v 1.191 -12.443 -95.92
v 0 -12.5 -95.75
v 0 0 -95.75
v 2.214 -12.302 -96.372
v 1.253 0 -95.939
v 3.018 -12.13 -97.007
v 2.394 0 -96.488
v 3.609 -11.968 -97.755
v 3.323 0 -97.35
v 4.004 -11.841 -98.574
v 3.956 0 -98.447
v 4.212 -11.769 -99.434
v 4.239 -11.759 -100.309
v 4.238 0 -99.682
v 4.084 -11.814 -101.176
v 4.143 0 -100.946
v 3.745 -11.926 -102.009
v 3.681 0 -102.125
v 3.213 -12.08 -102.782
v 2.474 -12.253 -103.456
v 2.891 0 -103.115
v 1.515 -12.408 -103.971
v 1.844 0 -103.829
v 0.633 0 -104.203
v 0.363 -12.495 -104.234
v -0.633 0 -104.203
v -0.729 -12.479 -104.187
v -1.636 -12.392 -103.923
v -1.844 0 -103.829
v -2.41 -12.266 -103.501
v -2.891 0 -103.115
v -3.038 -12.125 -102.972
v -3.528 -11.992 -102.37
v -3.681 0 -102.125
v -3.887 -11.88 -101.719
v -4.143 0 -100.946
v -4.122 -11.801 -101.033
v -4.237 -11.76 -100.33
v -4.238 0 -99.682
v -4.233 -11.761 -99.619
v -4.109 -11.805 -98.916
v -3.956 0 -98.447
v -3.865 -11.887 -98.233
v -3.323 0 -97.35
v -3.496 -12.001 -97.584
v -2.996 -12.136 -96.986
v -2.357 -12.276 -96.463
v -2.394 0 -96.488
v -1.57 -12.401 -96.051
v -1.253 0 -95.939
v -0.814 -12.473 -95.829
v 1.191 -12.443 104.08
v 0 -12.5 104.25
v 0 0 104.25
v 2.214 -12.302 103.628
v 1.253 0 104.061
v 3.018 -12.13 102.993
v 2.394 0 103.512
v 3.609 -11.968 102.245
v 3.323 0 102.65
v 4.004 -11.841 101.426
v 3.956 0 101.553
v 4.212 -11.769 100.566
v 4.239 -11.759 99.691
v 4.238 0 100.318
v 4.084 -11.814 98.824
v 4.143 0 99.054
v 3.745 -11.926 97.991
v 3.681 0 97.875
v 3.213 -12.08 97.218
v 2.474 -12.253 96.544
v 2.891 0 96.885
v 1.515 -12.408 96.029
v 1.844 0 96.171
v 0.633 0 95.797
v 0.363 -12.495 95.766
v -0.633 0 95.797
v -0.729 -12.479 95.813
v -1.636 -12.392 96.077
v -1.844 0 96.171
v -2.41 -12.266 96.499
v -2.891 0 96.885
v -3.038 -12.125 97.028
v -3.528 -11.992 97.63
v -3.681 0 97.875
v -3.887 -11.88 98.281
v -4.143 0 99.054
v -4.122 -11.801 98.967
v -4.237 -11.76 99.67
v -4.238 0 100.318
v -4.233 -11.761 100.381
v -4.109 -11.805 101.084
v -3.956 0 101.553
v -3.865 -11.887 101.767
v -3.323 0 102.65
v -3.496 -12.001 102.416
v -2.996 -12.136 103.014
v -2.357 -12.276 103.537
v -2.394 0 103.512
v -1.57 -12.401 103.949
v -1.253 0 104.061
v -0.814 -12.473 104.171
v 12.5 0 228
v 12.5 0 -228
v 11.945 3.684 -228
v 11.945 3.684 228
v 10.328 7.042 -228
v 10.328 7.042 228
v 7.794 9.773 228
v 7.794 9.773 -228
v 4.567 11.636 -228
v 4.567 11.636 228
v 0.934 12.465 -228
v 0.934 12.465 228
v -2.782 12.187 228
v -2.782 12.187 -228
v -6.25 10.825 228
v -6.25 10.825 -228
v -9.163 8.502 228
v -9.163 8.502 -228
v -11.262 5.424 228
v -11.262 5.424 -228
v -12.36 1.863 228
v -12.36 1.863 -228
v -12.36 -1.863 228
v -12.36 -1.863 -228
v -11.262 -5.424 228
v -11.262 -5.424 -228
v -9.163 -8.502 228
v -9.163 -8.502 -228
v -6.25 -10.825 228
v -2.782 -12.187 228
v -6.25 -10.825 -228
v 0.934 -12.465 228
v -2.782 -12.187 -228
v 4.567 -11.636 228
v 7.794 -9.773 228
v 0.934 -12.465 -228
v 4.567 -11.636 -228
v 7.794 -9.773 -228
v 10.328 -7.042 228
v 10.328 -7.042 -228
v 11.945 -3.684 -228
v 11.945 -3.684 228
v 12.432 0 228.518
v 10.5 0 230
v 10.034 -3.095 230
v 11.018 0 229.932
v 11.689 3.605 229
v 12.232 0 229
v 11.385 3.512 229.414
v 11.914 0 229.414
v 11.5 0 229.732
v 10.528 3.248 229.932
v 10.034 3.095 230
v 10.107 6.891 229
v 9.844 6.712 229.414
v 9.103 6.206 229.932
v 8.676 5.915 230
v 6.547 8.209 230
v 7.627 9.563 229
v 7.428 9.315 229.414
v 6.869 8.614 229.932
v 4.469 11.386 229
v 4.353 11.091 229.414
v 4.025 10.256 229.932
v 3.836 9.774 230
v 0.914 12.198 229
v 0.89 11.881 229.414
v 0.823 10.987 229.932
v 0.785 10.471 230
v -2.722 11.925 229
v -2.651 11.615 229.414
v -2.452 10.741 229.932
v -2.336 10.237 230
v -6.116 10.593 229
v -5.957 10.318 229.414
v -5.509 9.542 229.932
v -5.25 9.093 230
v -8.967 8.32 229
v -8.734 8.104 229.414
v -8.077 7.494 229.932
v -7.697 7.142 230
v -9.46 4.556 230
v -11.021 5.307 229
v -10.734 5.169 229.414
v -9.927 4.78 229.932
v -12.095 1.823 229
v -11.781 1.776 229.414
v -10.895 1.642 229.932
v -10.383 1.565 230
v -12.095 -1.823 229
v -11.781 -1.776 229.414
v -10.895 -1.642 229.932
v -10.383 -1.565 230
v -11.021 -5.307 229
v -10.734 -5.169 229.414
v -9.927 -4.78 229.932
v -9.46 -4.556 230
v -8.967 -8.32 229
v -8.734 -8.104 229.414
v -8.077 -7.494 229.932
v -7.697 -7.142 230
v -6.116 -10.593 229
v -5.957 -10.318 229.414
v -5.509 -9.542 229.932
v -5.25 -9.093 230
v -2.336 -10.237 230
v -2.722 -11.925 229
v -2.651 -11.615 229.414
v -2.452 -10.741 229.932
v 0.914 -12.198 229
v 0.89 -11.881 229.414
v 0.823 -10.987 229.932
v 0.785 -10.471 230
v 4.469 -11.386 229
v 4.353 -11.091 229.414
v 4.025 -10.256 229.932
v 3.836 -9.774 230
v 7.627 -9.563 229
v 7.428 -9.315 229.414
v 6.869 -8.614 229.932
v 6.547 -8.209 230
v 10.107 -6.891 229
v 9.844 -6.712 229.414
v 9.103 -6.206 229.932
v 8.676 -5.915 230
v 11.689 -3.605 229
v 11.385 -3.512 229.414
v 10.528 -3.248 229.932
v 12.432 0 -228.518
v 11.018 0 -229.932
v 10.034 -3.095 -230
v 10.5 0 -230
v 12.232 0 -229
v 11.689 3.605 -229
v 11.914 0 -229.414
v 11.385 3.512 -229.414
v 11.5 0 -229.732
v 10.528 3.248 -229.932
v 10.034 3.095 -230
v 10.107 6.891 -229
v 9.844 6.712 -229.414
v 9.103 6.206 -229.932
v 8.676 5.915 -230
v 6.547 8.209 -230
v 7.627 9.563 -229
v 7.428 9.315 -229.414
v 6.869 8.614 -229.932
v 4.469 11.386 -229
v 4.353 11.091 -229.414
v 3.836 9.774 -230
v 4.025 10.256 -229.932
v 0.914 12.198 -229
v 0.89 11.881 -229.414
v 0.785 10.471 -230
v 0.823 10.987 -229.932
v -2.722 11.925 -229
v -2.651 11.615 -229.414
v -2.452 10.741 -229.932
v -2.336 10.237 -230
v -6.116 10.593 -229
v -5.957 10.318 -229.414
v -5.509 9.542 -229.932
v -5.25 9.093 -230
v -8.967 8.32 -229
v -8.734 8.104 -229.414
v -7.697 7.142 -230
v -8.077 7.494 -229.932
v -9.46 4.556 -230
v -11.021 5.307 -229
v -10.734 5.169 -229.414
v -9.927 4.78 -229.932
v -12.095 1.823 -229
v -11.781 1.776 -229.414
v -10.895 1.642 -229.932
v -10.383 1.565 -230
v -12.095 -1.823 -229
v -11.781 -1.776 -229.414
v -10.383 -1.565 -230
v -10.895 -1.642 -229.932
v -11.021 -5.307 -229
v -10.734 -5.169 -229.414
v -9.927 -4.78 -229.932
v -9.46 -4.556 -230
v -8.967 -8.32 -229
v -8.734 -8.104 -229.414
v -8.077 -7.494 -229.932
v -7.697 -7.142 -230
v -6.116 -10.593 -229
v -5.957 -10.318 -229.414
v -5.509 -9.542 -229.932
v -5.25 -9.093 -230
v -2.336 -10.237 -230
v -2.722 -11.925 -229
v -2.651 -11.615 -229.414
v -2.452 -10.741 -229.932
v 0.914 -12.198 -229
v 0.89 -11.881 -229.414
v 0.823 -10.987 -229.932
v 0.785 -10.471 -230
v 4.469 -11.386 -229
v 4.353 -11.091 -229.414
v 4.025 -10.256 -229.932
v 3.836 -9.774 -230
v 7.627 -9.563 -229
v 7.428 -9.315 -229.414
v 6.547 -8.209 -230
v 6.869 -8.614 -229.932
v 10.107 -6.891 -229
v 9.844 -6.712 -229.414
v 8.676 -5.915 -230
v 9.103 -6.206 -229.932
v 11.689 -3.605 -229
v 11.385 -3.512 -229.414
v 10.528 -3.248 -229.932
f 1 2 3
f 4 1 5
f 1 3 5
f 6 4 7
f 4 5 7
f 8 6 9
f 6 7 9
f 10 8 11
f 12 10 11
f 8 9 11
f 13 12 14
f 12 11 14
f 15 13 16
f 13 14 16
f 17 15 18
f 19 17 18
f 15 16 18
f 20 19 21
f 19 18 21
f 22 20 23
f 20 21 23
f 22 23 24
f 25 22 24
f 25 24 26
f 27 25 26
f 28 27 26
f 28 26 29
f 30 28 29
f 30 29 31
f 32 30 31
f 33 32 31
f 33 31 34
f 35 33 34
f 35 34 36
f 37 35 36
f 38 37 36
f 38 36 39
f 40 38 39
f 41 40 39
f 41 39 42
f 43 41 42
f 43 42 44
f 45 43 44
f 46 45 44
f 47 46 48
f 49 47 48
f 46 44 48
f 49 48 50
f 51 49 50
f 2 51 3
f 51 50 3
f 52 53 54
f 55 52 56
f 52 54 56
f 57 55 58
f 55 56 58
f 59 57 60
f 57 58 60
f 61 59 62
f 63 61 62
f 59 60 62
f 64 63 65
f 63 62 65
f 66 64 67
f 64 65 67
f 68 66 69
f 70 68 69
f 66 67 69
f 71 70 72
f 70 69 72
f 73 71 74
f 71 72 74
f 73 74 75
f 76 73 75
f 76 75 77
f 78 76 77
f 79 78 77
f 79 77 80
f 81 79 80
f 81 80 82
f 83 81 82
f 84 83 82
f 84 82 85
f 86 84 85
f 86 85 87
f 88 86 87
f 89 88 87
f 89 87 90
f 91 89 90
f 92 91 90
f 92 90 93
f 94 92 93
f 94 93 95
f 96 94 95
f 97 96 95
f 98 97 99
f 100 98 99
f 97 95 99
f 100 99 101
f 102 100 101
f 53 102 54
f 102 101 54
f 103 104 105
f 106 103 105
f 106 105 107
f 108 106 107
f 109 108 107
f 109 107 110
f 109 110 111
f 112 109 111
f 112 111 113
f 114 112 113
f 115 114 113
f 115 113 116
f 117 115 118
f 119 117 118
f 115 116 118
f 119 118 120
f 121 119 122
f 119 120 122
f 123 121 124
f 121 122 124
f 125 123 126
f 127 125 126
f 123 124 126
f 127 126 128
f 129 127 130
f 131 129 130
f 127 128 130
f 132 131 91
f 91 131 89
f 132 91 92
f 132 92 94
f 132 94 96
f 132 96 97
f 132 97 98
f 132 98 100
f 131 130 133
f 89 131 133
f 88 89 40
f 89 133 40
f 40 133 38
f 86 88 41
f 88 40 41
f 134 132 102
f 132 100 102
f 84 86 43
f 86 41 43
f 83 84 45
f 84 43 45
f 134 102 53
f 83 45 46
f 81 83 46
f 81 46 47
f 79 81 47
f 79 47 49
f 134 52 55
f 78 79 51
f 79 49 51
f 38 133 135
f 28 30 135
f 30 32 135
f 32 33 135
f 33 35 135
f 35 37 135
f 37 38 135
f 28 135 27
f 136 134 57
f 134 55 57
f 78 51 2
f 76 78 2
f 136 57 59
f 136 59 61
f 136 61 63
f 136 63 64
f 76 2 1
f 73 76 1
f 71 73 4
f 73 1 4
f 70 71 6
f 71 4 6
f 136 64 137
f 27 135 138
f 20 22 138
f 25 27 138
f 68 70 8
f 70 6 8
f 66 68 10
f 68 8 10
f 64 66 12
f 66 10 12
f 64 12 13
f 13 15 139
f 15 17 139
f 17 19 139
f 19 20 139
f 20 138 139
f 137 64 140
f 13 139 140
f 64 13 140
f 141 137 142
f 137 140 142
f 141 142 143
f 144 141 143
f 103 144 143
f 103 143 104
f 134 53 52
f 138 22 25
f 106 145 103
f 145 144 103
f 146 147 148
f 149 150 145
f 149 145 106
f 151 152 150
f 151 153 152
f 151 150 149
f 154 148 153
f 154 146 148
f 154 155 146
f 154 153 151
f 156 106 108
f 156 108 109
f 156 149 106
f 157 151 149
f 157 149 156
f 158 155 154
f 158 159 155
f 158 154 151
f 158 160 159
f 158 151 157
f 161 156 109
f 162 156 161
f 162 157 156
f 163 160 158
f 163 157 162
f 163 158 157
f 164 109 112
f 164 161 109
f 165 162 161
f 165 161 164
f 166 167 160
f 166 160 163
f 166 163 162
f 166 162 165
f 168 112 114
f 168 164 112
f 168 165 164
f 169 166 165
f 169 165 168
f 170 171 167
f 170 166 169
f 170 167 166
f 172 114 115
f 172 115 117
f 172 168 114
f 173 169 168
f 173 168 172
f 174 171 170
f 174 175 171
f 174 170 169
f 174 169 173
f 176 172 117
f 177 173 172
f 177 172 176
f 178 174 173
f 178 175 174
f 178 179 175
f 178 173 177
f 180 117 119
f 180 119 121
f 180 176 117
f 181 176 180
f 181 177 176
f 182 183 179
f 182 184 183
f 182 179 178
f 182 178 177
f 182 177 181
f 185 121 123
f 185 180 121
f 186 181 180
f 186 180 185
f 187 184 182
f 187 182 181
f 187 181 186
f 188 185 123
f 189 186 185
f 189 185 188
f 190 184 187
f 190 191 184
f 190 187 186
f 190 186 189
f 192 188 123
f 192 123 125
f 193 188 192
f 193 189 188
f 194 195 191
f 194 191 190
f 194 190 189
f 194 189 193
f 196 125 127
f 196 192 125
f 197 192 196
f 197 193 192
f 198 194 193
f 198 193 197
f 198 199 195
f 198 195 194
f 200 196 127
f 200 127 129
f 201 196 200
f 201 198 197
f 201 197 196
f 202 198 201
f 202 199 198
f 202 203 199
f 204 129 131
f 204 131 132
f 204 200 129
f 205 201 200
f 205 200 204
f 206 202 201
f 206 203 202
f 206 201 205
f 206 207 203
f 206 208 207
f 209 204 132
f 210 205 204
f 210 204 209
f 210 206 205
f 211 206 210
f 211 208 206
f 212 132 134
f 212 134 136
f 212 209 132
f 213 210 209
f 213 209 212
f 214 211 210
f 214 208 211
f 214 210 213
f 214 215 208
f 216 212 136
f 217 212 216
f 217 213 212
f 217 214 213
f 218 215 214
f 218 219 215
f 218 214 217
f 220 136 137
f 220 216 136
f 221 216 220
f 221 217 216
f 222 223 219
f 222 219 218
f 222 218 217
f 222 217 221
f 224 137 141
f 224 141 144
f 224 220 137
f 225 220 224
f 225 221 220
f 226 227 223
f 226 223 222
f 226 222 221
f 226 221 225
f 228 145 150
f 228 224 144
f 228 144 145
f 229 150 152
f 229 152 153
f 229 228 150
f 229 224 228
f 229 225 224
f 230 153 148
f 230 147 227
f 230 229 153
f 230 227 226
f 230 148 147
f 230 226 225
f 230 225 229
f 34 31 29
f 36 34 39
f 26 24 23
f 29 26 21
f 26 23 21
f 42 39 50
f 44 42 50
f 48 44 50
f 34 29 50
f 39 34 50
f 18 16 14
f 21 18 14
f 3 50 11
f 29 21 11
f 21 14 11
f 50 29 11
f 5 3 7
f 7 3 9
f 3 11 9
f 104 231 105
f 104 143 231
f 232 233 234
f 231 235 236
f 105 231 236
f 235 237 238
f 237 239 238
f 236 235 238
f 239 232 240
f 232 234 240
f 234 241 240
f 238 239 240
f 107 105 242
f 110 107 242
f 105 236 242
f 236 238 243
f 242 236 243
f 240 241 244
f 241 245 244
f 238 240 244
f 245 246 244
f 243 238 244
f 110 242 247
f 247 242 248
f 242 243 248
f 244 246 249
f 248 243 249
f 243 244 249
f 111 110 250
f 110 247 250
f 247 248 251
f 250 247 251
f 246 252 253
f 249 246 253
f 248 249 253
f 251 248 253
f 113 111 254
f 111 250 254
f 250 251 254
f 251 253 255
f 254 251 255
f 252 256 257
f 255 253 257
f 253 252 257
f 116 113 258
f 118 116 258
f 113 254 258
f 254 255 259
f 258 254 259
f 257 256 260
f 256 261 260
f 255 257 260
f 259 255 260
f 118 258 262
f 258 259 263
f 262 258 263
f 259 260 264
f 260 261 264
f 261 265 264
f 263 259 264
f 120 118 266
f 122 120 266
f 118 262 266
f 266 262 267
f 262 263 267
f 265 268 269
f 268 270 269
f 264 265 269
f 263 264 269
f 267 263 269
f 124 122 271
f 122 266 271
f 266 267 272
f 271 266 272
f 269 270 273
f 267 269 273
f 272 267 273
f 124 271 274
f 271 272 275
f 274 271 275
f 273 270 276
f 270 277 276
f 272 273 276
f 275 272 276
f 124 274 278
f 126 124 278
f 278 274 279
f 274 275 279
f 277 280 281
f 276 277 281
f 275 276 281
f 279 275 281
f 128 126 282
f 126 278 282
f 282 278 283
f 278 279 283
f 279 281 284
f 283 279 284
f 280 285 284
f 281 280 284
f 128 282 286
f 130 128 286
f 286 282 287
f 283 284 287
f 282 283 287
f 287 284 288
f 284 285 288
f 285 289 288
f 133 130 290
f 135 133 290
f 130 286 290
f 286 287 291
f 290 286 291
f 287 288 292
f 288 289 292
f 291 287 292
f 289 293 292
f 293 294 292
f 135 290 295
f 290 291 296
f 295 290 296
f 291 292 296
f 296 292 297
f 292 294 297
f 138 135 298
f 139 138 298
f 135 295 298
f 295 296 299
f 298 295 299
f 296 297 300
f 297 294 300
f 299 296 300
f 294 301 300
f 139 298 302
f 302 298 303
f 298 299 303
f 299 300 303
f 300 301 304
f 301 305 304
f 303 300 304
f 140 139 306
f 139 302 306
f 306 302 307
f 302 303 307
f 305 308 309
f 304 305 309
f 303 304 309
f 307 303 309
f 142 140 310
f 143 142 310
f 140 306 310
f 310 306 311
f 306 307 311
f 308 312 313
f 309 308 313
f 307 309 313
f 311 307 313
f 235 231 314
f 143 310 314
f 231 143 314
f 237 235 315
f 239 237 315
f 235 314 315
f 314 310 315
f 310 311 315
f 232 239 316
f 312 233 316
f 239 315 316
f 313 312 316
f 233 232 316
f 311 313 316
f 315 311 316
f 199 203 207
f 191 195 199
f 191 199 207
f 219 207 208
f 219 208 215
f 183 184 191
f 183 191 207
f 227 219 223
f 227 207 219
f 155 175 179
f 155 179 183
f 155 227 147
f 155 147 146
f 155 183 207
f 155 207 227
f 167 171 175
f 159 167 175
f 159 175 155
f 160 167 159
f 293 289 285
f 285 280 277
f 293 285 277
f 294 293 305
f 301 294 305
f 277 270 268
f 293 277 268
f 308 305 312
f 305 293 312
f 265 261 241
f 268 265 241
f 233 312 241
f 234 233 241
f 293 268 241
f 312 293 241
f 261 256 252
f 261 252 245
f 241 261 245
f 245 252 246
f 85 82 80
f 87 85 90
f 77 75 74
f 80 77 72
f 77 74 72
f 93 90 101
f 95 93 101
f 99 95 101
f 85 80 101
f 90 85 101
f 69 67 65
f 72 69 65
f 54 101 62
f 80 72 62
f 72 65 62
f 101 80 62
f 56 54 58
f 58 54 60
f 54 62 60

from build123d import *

# Parameters (mm, degrees)
Y_KSEKLIK_EKSTR_ZYON1_DEPTH      = 230
Y_KSEKLIK_EKSTR_ZYON1_DEPTH_BACK = 230
IZIM1_R                          = 12.5
IZIM2_R                          = 4.25
KES_EKSTR_ZYON1_DEPTH            = 50
RADYUS1_R                        = 2


with BuildPart() as part:
    # Çizim1 → Yükseklik-Ekstrüzyon1 (new, two sides: drawn at the far end of the back side and taken through both)
    with BuildSketch(Plane.XY.offset(-Y_KSEKLIK_EKSTR_ZYON1_DEPTH_BACK)):
        Circle(IZIM1_R)
    extrude(amount=Y_KSEKLIK_EKSTR_ZYON1_DEPTH + Y_KSEKLIK_EKSTR_ZYON1_DEPTH_BACK)

    # Çizim2 → Kes-Ekstrüzyon1 (cut)
    with BuildSketch(Plane(origin=(0, 0, 0), x_dir=(1, 0, 0), z_dir=(0, 1, 0))):
        with Locations((0, 100)):
            Circle(IZIM2_R)
        with Locations((0, -100)):
            Circle(IZIM2_R)
    extrude(amount=-KES_EKSTR_ZYON1_DEPTH, mode=Mode.SUBTRACT)

    # Radyus1
    radyus1_edges = [part.edges().sort_by_distance(p)[0] for p in [
        (-12.5, 0, 230),
        (-12.5, 0, -230),
    ]]
    fillet(radyus1_edges, radius=RADYUS1_R)


solid = part.part
